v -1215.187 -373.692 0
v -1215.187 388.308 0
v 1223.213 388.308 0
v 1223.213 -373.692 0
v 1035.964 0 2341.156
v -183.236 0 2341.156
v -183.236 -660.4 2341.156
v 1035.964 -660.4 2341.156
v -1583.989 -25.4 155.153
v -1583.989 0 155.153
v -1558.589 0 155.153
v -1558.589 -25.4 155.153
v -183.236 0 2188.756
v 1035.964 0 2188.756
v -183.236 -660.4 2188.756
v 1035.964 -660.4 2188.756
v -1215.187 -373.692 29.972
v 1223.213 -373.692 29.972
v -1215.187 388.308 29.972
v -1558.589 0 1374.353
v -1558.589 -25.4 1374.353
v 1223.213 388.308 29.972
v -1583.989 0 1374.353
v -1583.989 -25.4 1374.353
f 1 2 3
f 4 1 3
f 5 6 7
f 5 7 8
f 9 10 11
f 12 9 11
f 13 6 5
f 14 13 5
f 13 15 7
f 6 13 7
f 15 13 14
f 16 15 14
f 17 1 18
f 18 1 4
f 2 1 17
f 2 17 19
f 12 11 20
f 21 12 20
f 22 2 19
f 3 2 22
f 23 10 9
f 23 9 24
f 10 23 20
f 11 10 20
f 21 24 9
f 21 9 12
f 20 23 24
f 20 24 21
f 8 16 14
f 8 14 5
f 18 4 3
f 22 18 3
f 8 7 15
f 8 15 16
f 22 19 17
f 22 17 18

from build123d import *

# Parameters (mm, degrees)
F0_W     = 2438.4
F0_H     = 762
F1_DEPTH = 29.972
F2_W     = 153.752804
F2_H     = 446.217656
F3_DEPTH = 25.4
F5_W     = 25.4
F5_H     = 1219.2
F6_DEPTH = 25.4
F7_W     = 1219.2
F7_H     = 152.4
F8_DEPTH = 660.4


with BuildPart() as f1:
    # F0 (on Top) → F1 (new body)
    with BuildSketch(Plane.XY):
        with Locations((4.013447, 7.308213)):
            Rectangle(F0_W, F0_H)
    extrude(amount=F1_DEPTH)


with BuildPart() as f3:
    # F2 (on Front) → F3 (new body)
    with BuildSketch(Plane.XZ):
        with Locations((-1692.282081, 223.108828)):
            Rectangle(F2_W, F2_H)
    extrude(amount=F3_DEPTH)


with BuildPart() as f6:
    # F5 (on Front) → F6 (new body)
    with BuildSketch(Plane.XZ):
        with Locations((-1571.289301, 764.75303)):
            Rectangle(F5_W, F5_H)
    extrude(amount=F6_DEPTH)


with BuildPart() as f8:
    # F7 (on Front) → F8 (new body)
    with BuildSketch(Plane.XZ):
        with Locations((426.364049, 2264.956028)):
            Rectangle(F7_W, F7_H)
    extrude(amount=F8_DEPTH)


solid = Compound([f1.part, f6.part, f8.part])
